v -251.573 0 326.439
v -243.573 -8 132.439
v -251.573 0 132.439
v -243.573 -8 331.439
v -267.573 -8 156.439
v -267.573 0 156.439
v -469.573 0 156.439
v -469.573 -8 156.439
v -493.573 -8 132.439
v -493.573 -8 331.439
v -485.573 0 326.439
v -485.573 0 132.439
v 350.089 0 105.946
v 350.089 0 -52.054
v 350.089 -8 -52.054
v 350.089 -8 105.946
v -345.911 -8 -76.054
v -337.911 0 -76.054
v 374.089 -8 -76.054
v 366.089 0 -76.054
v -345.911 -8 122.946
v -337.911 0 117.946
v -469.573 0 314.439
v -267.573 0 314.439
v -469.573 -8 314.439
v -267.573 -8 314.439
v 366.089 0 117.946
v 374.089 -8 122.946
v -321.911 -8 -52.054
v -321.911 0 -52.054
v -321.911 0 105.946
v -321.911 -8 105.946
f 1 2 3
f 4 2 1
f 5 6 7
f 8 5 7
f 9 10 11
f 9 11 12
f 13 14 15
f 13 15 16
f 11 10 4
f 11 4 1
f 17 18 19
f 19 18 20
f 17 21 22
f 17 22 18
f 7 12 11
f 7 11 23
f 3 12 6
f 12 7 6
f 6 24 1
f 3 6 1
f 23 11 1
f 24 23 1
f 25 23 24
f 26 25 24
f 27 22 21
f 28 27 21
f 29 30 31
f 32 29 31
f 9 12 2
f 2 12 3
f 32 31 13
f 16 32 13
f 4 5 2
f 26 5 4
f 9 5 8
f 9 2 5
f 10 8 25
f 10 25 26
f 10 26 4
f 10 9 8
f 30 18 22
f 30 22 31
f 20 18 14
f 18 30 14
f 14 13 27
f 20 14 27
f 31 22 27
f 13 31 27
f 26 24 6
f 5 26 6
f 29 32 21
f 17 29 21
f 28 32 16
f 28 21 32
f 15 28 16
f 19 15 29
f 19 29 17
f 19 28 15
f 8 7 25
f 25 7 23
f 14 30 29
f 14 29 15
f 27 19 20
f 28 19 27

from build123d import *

# Parameters (mm, degrees)
F0_W     = 24
F0_H     = 12
F0_W_2   = 672
F0_H_2   = 158
F0_H_3   = 24
F1_DEPTH = 8
F3_DEPTH = 720
F4_SIZE  = 7.99999
F5_W     = 24
F5_H     = 24
F5_W_2   = 202
F5_H_2   = 158
F5_H_3   = 12
F6_DEPTH = 8
F8_DEPTH = 250
F9_SIZE  = 7.99999


# Not quite as in the source:
# - a fillet or chamfer is up to 0.001 mm smaller than in the source, because OpenCascade refuses the exact size


with BuildPart() as f1:
    # F0 (on Front) → F1 (new body)
    with BuildSketch(Plane.XZ):
        with Locations((-333.9108440578, 111.9455863265)):
            Rectangle(F0_W, F0_H)
        with Locations((14.0891559422, 111.9455863265)):
            Rectangle(F0_W_2, F0_H)
        with Locations((-333.9108440578, 26.9455863265)):
            Rectangle(F0_W, F0_H_2)
        with Locations((-333.9108440578, -64.0544136735)):
            Rectangle(F0_W, F0_H_3)
        with Locations((14.0891559422, -64.0544136735)):
            Rectangle(F0_W_2, F0_H_3)
        with Locations((362.0891559422, 111.9455863265)):
            Rectangle(F0_W, F0_H)
        with Locations((362.0891559422, 26.9455863265)):
            Rectangle(F0_W, F0_H_2)
        with Locations((362.0891559422, -64.0544136735)):
            Rectangle(F0_W, F0_H_3)
    extrude(amount=F1_DEPTH)

    # F2 (on face) → F3 (join)
    with BuildSketch(Plane.YZ.offset(374.0891559422)):
        Polygon((-8, 122.9455863265), (-8, 117.9455863265), (0, 117.9455863265), align=None)
    extrude(amount=-F3_DEPTH)

    # F4 (size 8 in the source; OpenCascade refuses exactly that, so slightly less here)
    f4_edges = [f1.edges().sort_by_distance(p)[0] for p in [
        (374.089156, 0, 20.945586),
        (-345.910844, 0, 20.945586),
    ]]
    chamfer(f4_edges, length=F4_SIZE)


with BuildPart() as f6:
    # F5 (on Front) → F6 (new body)
    with BuildSketch(Plane.XZ):
        with Locations((-255.5729791075, 144.4389531016)):
            Rectangle(F5_W, F5_H)
        with Locations((-368.5729791075, 144.4389531016)):
            Rectangle(F5_W_2, F5_H)
        with Locations((-255.5729791075, 235.4389531016)):
            Rectangle(F5_W, F5_H_2)
        with Locations((-481.5729791075, 144.4389531016)):
            Rectangle(F5_W, F5_H)
        with Locations((-255.5729791075, 320.4389531016)):
            Rectangle(F5_W, F5_H_3)
        with Locations((-481.5729791075, 235.4389531016)):
            Rectangle(F5_W, F5_H_2)
        with Locations((-368.5729791075, 320.4389531016)):
            Rectangle(F5_W_2, F5_H_3)
        with Locations((-481.5729791075, 320.4389531016)):
            Rectangle(F5_W, F5_H_3)
    extrude(amount=F6_DEPTH)

    # F7 (on face) → F8 (join)
    with BuildSketch(Plane(origin=(-493.5729791075, 0, 0), x_dir=(0, -1, 0), z_dir=(-1, 0, 0))):
        Polygon((0, 326.4389531016), (8, 326.4389531016), (8, 331.4389531016), align=None)
    extrude(amount=-F8_DEPTH)

    # F9 (size 8 in the source; OpenCascade refuses exactly that, so slightly less here)
    f9_edges = [f6.edges().sort_by_distance(p)[0] for p in [
        (-493.572979, 0, 229.438953),
        (-243.572979, 0, 229.438953),
    ]]
    chamfer(f9_edges, length=F9_SIZE)


solid = Compound([f1.part, f6.part])
